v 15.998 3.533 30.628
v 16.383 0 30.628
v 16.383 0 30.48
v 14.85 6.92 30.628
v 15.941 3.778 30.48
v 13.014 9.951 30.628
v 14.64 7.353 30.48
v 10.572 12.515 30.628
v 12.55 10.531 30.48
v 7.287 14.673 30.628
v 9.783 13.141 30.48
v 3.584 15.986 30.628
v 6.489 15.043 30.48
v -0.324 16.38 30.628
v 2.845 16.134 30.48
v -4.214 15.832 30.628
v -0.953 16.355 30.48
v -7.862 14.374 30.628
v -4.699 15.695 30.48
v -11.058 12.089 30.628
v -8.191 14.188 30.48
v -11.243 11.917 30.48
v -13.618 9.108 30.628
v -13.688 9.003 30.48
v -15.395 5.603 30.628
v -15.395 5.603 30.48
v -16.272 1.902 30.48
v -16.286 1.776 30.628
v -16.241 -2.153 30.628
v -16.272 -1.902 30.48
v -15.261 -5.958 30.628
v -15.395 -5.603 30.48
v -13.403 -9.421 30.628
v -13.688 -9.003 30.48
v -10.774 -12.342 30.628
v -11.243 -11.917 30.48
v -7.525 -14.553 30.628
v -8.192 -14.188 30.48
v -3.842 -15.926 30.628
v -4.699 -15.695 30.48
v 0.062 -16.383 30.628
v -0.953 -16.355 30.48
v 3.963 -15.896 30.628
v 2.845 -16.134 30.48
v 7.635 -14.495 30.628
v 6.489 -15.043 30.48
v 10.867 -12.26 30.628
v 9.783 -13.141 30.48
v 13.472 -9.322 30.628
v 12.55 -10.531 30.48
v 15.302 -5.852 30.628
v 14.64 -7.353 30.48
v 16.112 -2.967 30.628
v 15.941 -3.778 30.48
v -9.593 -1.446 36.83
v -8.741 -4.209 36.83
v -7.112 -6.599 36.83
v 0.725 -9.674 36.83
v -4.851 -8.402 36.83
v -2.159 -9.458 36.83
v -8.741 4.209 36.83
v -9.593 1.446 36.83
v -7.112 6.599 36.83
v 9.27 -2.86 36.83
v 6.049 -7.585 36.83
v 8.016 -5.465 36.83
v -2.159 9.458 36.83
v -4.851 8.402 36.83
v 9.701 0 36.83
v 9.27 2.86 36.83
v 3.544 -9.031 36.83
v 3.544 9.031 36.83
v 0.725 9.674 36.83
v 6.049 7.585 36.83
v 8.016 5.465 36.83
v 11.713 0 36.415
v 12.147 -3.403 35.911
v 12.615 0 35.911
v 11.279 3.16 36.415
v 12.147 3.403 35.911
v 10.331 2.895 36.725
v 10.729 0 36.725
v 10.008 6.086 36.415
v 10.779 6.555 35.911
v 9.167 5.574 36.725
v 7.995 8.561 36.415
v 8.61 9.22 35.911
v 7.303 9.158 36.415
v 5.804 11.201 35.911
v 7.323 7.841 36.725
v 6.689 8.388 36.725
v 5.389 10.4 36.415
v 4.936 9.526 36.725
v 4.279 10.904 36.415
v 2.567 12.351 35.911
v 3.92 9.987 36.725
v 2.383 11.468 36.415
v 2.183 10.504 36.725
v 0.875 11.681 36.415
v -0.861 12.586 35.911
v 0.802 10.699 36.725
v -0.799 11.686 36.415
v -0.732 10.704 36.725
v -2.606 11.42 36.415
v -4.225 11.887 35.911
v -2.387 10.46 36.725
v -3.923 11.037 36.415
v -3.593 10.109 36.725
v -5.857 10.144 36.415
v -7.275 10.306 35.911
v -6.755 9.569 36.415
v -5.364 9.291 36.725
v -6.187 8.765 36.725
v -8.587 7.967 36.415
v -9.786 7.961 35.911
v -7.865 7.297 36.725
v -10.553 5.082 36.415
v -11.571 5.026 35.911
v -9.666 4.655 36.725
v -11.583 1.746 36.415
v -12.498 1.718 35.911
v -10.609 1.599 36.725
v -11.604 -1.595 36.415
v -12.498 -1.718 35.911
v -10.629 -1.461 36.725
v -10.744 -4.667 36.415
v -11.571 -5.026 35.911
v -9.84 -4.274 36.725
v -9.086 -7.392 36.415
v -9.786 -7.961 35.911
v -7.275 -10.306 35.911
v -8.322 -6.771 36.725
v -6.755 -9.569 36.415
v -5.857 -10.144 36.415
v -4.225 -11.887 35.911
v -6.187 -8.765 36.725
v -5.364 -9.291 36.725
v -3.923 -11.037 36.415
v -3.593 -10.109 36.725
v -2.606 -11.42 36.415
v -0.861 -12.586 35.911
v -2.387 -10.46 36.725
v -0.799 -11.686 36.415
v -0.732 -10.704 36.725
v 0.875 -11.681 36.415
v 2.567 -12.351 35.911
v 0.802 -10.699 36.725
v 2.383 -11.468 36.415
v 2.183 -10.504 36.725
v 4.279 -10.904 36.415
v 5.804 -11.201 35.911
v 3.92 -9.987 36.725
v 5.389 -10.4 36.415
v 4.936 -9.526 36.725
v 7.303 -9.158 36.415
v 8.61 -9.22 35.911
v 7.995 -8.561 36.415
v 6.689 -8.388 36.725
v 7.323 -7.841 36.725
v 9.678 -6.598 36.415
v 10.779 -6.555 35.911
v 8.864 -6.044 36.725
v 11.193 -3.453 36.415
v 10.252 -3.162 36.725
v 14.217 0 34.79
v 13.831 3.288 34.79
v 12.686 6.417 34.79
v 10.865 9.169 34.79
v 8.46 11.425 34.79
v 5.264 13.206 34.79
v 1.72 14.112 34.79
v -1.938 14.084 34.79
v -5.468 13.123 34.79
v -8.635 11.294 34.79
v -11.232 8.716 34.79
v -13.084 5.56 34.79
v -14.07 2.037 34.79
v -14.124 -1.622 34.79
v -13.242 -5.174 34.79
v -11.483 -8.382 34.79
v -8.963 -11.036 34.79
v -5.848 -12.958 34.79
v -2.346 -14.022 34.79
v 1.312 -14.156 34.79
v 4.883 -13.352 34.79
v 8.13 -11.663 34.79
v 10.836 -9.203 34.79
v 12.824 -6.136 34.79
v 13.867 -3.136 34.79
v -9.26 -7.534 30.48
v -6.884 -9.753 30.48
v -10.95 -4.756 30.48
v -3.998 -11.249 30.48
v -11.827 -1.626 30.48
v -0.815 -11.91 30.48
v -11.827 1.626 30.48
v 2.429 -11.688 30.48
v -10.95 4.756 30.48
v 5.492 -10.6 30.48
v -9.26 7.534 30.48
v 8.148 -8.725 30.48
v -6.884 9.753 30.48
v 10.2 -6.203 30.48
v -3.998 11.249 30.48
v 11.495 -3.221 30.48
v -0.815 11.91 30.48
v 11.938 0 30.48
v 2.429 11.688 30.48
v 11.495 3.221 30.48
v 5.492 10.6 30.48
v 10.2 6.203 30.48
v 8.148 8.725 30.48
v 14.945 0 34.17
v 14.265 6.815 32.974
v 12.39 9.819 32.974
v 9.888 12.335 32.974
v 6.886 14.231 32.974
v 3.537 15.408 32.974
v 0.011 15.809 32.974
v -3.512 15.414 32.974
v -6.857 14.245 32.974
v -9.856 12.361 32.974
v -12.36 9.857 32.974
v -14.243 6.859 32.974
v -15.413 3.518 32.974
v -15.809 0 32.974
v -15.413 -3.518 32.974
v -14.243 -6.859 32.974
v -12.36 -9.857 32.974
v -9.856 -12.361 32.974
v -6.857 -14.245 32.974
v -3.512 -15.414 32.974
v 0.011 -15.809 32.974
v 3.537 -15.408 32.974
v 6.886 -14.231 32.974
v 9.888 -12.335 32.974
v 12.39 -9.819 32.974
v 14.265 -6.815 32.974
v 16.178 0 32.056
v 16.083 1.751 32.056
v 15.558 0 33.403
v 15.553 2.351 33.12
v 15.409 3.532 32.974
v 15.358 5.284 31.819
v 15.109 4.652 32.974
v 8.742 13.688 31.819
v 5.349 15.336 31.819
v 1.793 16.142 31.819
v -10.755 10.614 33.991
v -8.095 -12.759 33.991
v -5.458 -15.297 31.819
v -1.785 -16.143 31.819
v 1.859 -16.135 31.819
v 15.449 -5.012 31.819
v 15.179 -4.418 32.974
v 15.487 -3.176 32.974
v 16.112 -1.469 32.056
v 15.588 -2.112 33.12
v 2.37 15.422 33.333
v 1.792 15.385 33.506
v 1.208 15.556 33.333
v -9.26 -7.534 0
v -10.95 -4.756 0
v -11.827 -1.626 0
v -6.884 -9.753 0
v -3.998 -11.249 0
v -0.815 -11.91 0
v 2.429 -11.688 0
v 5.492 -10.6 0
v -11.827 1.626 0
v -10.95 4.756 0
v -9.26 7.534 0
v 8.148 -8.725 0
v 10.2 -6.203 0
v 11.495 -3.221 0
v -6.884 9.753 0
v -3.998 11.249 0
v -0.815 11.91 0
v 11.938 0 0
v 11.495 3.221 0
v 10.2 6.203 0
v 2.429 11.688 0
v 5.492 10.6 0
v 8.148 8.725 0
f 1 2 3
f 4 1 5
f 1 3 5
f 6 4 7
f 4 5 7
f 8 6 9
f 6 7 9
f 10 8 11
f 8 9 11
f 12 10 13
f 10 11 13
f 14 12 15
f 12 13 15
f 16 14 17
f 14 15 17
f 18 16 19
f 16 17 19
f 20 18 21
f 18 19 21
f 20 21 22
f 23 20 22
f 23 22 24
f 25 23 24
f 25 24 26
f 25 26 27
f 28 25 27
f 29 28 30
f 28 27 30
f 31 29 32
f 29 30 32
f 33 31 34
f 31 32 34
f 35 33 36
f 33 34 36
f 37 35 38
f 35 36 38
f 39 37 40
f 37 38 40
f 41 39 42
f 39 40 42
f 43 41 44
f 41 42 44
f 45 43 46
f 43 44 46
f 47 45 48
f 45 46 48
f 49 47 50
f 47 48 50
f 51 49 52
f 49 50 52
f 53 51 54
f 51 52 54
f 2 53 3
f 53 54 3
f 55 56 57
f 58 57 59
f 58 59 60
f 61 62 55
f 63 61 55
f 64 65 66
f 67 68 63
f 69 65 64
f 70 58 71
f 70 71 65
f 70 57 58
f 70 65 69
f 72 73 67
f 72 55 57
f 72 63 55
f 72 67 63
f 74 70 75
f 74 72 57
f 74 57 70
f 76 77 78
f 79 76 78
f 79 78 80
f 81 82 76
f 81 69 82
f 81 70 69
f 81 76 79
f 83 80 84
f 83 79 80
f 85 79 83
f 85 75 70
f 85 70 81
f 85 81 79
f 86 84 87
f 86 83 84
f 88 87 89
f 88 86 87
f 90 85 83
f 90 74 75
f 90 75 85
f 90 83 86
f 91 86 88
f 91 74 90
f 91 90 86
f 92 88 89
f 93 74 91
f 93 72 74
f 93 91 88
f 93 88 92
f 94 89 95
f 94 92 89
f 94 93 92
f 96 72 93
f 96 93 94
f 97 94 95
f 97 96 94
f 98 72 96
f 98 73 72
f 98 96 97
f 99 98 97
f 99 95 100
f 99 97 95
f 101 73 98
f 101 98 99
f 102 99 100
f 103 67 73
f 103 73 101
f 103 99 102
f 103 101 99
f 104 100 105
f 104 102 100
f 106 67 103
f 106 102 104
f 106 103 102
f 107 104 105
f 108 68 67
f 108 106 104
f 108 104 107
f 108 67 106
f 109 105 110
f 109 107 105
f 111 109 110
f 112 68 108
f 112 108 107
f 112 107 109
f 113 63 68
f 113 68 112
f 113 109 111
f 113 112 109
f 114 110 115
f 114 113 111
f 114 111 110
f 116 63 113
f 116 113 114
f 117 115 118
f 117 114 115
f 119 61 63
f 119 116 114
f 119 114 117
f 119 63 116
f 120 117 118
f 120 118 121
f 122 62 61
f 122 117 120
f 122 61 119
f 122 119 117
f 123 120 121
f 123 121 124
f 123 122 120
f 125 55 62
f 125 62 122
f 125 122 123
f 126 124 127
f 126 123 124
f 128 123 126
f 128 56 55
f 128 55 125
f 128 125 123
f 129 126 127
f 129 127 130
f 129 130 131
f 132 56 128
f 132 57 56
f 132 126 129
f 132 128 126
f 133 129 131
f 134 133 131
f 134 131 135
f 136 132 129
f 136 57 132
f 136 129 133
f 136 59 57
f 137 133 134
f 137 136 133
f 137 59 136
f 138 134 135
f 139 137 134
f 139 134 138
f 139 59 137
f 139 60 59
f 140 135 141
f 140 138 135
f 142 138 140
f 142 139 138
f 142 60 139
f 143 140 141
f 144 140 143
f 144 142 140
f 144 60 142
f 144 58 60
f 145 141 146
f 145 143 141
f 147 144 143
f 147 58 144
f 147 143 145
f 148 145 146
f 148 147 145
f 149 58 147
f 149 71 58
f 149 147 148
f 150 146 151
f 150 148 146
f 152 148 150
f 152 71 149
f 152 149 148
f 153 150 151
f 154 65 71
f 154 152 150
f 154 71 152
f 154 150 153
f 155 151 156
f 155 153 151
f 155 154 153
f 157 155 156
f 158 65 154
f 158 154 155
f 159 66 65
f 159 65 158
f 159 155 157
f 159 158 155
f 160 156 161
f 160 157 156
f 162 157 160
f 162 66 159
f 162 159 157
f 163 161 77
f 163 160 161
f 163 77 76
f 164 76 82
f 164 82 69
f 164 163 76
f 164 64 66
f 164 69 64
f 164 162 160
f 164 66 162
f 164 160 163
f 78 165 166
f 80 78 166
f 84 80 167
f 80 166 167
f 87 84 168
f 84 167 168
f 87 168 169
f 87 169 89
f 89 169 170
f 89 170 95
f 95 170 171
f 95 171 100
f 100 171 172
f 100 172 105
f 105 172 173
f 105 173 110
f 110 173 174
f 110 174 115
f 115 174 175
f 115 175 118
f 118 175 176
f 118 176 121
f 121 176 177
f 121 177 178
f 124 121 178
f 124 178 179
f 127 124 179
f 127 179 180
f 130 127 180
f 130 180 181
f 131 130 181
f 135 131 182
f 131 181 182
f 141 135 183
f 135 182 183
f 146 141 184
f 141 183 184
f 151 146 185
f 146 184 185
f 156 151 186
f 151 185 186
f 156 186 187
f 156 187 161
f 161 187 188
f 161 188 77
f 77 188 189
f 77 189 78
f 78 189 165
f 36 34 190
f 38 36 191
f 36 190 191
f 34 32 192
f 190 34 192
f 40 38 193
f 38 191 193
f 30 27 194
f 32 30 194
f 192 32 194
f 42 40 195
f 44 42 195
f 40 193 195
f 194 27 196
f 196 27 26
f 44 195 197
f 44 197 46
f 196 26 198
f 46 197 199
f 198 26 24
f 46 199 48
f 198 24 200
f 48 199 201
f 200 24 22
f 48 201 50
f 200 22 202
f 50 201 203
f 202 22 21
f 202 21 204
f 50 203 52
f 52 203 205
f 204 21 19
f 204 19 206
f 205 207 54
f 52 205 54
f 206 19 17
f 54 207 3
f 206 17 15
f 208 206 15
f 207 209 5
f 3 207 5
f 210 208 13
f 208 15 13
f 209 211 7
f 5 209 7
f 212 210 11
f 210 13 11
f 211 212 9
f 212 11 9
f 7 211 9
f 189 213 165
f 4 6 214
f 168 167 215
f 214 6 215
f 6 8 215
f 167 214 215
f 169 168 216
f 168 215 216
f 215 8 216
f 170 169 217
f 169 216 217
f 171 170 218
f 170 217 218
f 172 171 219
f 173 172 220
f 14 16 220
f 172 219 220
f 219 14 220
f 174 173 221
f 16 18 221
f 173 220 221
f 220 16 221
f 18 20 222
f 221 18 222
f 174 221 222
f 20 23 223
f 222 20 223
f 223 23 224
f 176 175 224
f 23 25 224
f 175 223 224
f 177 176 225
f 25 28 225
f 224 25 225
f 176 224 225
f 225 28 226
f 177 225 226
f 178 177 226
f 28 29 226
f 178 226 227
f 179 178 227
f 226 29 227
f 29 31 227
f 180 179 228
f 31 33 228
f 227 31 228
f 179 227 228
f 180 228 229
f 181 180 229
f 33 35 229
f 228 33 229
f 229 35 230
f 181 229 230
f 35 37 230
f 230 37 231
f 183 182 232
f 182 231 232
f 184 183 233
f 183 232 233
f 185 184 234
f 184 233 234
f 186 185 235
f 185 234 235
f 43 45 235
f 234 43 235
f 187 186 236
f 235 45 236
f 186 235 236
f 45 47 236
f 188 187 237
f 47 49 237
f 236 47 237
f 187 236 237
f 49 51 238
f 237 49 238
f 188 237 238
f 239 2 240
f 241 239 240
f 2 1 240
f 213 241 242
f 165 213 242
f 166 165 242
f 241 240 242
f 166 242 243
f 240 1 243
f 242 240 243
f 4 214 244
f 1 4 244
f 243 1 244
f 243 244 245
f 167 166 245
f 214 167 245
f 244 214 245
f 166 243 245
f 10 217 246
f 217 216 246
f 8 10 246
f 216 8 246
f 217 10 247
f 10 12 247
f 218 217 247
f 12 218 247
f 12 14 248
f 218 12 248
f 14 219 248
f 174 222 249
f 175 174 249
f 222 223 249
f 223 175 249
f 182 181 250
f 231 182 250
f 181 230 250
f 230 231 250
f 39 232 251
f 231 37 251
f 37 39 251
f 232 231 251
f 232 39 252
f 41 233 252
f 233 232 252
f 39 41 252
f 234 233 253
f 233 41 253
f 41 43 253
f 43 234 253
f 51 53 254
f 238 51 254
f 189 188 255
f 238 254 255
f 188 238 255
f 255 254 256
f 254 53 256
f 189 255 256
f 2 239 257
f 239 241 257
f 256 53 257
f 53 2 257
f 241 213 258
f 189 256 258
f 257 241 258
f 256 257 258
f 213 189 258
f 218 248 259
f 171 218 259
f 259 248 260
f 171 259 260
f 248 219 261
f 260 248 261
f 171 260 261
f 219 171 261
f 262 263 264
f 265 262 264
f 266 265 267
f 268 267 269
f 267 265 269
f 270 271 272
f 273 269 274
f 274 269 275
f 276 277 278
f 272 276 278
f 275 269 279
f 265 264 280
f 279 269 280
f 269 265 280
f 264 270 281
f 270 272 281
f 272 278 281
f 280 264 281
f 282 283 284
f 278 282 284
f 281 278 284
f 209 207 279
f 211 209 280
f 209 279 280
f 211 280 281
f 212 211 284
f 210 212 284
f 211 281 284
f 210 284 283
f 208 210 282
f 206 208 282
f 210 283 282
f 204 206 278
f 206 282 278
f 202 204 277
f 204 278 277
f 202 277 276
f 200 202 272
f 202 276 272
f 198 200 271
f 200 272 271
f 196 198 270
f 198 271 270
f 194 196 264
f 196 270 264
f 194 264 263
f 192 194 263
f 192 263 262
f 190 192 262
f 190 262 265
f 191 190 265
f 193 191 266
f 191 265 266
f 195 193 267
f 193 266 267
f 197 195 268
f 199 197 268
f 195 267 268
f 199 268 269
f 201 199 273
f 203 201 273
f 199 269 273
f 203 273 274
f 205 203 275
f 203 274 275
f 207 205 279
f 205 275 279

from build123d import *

# Parameters (mm, degrees)
F0_R     = 11.938
F1_DEPTH = 30.48
F2_R     = 16.383
F2_R_2   = 11.938
F3_DEPTH = 6.35
F4_SIZE2 = 3.5570542941
F4_SIZE  = 5.08
F5_R     = 5.08


with BuildPart() as f1:
    # F0 (on Top) → F1 (new body)
    with BuildSketch(Plane.XY):
        Circle(F0_R)
    extrude(amount=F1_DEPTH)

    # F2 (on face) → F3 (join)
    with BuildSketch(Plane.XY.offset(30.48)):
        Circle(F2_R)
        Circle(F2_R_2, mode=Mode.SUBTRACT)
        Circle(F2_R_2)
    extrude(amount=F3_DEPTH)

    # F4
    f4_edges = [f1.edges().sort_by_distance(p)[0] for p in [
        (-16.383, 0, 36.83),
    ]]
    f4_side = f1.faces().sort_by_distance((0, 0, 36.83))[0]
    chamfer(f4_edges, length=F4_SIZE, length2=F4_SIZE2, reference=f4_side)

    # F5
    f5_edges = [f1.edges().sort_by_distance(p)[0] for p in [
        (-11.303, 0, 36.83),
        (-16.383, 0, 33.272946),
    ]]
    fillet(f5_edges, radius=F5_R)


solid = f1.part
